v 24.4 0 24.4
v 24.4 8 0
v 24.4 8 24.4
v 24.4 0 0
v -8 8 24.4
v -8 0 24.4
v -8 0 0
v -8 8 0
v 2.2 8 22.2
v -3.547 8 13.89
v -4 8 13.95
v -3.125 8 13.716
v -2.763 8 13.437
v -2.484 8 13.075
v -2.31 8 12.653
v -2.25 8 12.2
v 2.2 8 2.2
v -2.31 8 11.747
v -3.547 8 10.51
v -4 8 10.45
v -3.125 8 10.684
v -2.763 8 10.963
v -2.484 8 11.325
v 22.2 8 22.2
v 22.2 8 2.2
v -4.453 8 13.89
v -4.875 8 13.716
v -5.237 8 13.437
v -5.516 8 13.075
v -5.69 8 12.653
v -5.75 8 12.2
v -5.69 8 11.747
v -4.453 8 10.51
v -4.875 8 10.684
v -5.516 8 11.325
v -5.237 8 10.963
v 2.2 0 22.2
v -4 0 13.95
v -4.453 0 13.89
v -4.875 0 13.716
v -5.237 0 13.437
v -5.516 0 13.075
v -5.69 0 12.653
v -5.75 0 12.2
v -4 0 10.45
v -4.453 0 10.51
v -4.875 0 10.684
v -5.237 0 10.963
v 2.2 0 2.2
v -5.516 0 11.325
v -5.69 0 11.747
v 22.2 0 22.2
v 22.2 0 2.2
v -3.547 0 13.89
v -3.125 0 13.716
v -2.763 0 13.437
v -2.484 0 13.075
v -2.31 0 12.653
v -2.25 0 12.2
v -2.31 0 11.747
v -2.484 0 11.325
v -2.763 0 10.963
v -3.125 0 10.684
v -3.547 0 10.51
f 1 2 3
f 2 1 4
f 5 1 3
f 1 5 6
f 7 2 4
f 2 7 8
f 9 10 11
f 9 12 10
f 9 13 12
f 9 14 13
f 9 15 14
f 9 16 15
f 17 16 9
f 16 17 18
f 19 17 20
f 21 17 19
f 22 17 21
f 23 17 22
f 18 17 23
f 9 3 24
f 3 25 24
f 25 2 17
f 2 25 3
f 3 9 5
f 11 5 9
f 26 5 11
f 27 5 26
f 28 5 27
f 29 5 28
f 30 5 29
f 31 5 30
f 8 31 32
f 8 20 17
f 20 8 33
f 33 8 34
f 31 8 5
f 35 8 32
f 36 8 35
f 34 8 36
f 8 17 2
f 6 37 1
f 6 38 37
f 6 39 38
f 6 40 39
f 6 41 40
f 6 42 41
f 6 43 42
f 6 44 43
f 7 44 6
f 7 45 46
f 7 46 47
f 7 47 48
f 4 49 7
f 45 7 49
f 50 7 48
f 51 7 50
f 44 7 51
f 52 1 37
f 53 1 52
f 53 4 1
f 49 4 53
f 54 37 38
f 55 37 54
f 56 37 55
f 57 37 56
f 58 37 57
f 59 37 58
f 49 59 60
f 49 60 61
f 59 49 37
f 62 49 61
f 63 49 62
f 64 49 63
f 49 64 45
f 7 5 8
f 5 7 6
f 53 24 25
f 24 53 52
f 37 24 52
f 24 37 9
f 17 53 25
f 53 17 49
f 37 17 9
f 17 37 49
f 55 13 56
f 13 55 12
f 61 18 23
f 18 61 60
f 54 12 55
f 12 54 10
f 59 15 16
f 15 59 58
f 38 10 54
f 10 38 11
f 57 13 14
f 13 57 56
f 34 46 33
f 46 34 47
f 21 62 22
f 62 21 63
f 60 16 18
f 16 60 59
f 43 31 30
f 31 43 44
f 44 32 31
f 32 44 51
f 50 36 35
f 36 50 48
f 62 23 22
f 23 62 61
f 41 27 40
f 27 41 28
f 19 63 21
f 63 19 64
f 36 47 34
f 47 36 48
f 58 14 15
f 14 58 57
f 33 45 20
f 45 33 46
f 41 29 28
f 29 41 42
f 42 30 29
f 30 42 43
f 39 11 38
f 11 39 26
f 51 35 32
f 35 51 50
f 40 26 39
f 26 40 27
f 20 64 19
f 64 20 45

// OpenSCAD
// Soporte abierto para placa SHT31 típica de 20 x 20 mm.
// Confirmar placa real antes de fabricación definitiva.

plate_w=20;
plate_h=20;
wall=2.2;
depth=8;

difference() {
    union() {
        cube([plate_w+2*wall, depth, plate_h+2*wall]);
        translate([-8,0,0]) cube([8,depth,plate_h+2*wall]);
    }
    translate([wall,-1,wall])
        cube([plate_w,depth+2,plate_h]);
    translate([-4,-1,(plate_h+2*wall)/2])
        rotate([-90,0,0])
            cylinder(h=depth+2,d=3.5,$fn=24);
}
